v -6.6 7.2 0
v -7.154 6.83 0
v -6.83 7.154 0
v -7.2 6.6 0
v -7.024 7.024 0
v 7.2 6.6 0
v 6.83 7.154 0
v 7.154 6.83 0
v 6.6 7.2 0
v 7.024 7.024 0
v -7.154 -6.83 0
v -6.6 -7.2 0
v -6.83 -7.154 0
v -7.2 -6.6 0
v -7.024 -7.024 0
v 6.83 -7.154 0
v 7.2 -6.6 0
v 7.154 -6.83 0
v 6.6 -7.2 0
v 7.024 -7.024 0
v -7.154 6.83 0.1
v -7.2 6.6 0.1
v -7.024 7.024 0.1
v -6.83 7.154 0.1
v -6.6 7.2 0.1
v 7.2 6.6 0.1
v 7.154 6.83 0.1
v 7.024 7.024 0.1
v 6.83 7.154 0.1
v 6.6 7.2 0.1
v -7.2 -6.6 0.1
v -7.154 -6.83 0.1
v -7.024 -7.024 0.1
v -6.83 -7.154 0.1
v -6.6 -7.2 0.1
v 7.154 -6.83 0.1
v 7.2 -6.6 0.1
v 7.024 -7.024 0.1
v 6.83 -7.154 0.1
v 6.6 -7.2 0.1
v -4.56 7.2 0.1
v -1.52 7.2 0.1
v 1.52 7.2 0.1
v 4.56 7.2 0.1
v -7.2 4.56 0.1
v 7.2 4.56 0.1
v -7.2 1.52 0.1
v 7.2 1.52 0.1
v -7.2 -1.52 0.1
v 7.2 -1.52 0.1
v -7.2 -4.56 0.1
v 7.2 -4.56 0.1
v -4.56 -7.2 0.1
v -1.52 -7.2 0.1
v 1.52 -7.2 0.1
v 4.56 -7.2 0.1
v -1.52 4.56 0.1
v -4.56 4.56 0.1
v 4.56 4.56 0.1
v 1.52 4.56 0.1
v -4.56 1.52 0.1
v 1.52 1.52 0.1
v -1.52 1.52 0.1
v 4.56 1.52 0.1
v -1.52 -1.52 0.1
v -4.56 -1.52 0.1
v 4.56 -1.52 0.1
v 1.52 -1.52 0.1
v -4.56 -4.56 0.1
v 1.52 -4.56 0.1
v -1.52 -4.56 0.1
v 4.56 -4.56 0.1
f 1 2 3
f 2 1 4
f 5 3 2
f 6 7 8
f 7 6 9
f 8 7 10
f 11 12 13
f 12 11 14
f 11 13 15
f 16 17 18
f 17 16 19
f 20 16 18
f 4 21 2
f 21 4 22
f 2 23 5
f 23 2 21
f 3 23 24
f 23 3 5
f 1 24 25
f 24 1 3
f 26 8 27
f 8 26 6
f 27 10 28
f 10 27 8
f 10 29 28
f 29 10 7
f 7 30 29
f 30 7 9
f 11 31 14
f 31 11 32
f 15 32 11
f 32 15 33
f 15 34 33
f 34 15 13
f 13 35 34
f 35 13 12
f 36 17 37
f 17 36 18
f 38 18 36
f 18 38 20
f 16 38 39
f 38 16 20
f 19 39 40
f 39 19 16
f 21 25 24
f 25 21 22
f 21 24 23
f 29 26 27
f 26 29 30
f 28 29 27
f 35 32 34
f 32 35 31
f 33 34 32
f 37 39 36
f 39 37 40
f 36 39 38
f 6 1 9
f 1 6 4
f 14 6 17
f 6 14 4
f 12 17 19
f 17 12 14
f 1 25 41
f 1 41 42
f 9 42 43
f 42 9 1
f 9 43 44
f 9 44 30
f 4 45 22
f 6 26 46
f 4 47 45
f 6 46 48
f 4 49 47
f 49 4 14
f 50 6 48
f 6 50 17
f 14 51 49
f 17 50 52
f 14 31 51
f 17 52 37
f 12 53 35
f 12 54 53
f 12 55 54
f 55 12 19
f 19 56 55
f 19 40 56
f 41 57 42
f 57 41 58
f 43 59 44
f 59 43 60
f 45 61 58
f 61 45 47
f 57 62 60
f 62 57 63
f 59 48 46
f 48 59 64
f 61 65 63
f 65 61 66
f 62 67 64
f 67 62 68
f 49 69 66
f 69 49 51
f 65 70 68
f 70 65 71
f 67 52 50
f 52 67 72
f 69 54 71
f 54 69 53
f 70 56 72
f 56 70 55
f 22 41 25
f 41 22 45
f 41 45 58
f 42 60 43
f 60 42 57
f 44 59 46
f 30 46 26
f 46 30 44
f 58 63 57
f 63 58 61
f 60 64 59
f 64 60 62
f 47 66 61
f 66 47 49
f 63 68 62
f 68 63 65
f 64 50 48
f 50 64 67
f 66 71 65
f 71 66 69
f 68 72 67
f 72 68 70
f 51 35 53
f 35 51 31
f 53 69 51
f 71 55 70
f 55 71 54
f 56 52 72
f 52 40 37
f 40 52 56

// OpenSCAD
// file: ../p/1-4cyli.scad
use <../lib.scad>
function ldraw_lib__1_4cyli() = [
// 0 Cylinder 0.25
// 0 Name: 1-4cyli.dat
// 0 Author: James Jessiman
// 0 !LDRAW_ORG Primitive UPDATE 2012-01
// 0 !LICENSE Licensed under CC BY 4.0 : see CAreadme.txt
// 
// 0 BFC CERTIFY CCW
  [0,"BFC","CERTIFY"],
  [0,"BFC","CCW"],
// 
// 0 !HISTORY 2002-03-23 [sbliss] Added BFC statement.
// 0 !HISTORY 2002-04-25 [PTadmin] Official Update 2002-02
// 0 !HISTORY 2007-06-22 [PTadmin] Header formatted for Contributor Agreement
// 0 !HISTORY 2008-07-01 [PTadmin] Official Update 2008-01
// 0 !HISTORY 2012-02-16 [Philo] Changed to CCW
// 0 !HISTORY 2012-03-30 [PTadmin] Official Update 2012-01
// 
// 
// 4 16 1 1 0 0.9239 1 0.3827 0.9239 0 0.3827 1 0 0
  [4,16,1,1,0,0.9239,1,0.3827,0.9239,0,0.3827,1,0,0],
// 5 24 1 0 0 1 1 0 0.9239 0 0.3827 1 0 -1
  [5,24,1,0,0,1,1,0,0.9239,0,0.3827,1,0,-1],
// 4 16 0.9239 1 0.3827 0.7071 1 0.7071 0.7071 0 0.7071 0.9239 0 0.3827
  [4,16,0.9239,1,0.3827,0.7071,1,0.7071,0.7071,0,0.7071,0.9239,0,0.3827],
// 5 24 0.9239 0 0.3827 0.9239 1 0.3827 0.7071 0 0.7071 1 0 0
  [5,24,0.9239,0,0.3827,0.9239,1,0.3827,0.7071,0,0.7071,1,0,0],
// 4 16 0.7071 1 0.7071 0.3827 1 0.9239 0.3827 0 0.9239 0.7071 0 0.7071
  [4,16,0.7071,1,0.7071,0.3827,1,0.9239,0.3827,0,0.9239,0.7071,0,0.7071],
// 5 24 0.7071 0 0.7071 0.7071 1 0.7071 0.3827 0 0.9239 0.9239 0 0.3827
  [5,24,0.7071,0,0.7071,0.7071,1,0.7071,0.3827,0,0.9239,0.9239,0,0.3827],
// 4 16 0.3827 1 0.9239 0 1 1 0 0 1 0.3827 0 0.9239
  [4,16,0.3827,1,0.9239,0,1,1,0,0,1,0.3827,0,0.9239],
// 5 24 0.3827 0 0.9239 0.3827 1 0.9239 0 0 1 0.7071 0 0.7071
  [5,24,0.3827,0,0.9239,0.3827,1,0.9239,0,0,1,0.7071,0,0.7071],
// 5 24 0 0 1 0 1 1 0.3827 0 0.9239 -1 0 1
  [5,24,0,0,1,0,1,1,0.3827,0,0.9239,-1,0,1],
];
module ldraw_lib__1_4cyli(step=0, col=false, unit=2/5, alt=false, line=0.2, solid=!$preview)
    makepoly(ldraw_lib__1_4cyli(), step=step, col=col, unit=unit, alt=alt, line=line, solid=solid);
ldraw_lib__1_4cyli(line=0.2);
// file: ../p/1-4chrd.scad
use <../lib.scad>
function ldraw_lib__1_4chrd() = [
// 0 Chord 0.25
// 0 Name: 1-4chrd.dat
// 0 Author: Max Martin Richter [MMR1988]
// 0 !LDRAW_ORG Primitive UPDATE 2023-05
// 0 !LICENSE Licensed under CC BY 4.0 : see CAreadme.txt
// 
// 0 BFC CERTIFY CCW
  [0,"BFC","CERTIFY"],
  [0,"BFC","CCW"],
// 
// 0 !HISTORY 2004-04-22 [PTadmin] Official Update 2004-02
// 0 !HISTORY 2007-10-09 [PTadmin] Header formatted for Contributor Agreement
// 0 !HISTORY 2008-07-01 [PTadmin] Official Update 2008-01
// 0 !HISTORY 2012-08-02 [MMR1988] Re-creation with PrimGen2 and Rectifier
// 0 !HISTORY 2012-08-09 [PTadmin] Official Update 2012-02
// 0 !HISTORY 2023-10-27 [OrionP] Change author to MMR1988 from hafhead
// 0 !HISTORY 2023-10-31 [OrionP] Official Update 2023-05
// 
// 4 16 0.9239 0 0.3827 0.3827 0 0.9239 0 0 1 1 0 0
  [4,16,0.9239,0,0.3827,0.3827,0,0.9239,0,0,1,1,0,0],
// 3 16 0.7071 0 0.7071 0.3827 0 0.9239 0.9239 0 0.3827
  [3,16,0.7071,0,0.7071,0.3827,0,0.9239,0.9239,0,0.3827],
];
module ldraw_lib__1_4chrd(step=0, col=false, unit=2/5, alt=false, line=0.2, solid=!$preview)
    makepoly(ldraw_lib__1_4chrd(), step=step, col=col, unit=unit, alt=alt, line=line, solid=solid);
ldraw_lib__1_4chrd(line=0.2);
// main file
use <../lib.scad>
use <../p/1-4chrd.scad>
use <../p/1-4cyli.scad>
function ldraw_lib__6221655aj() = [
// 0 Sticker  1.8 x  1.8 Chequered
// 0 Name: 6221655aj.dat
// 0 Author: Massimo Maso [Sirio]
// 0 !LDRAW_ORG Part UPDATE 2024-09
// 0 !LICENSE Licensed under CC BY 4.0 : see CAreadme.txt
// 
// 0 BFC CERTIFY CCW
  [0,"BFC","CERTIFY"],
  [0,"BFC","CCW"],
// 
// 0 !KEYWORDS 3.0, 911 RSR, Porsche, Set 75888, Speed Champions, Turbo
// 
// 0 !HISTORY 2024-10-27 [OrionP] Official Update 2024-09
// 
// 0 // Primitives
// 1 16 -16.5 0 16.5 -1.5 0 0 0 -1 0 0 0 1.5 1-4chrd.dat
  [1,16,-16.5,0,16.5,-1.5,0,0,0,-1,0,0,0,1.5, ldraw_lib__1_4chrd()],
// 1 16 16.5 0 16.5 1.5 0 0 0 -1 0 0 0 1.5 1-4chrd.dat
  [1,16,16.5,0,16.5,1.5,0,0,0,-1,0,0,0,1.5, ldraw_lib__1_4chrd()],
// 1 16 -16.5 0 -16.5 -1.5 0 0 0 -1 0 0 0 -1.5 1-4chrd.dat
  [1,16,-16.5,0,-16.5,-1.5,0,0,0,-1,0,0,0,-1.5, ldraw_lib__1_4chrd()],
// 1 16 16.5 0 -16.5 1.5 0 0 0 -1 0 0 0 -1.5 1-4chrd.dat
  [1,16,16.5,0,-16.5,1.5,0,0,0,-1,0,0,0,-1.5, ldraw_lib__1_4chrd()],
// 1 16 -16.5 0 16.5 -1.5 0 0 0 -.25 0 0 0 1.5 1-4cyli.dat
  [1,16,-16.5,0,16.5,-1.5,0,0,0,-.25,0,0,0,1.5, ldraw_lib__1_4cyli()],
// 1 16 16.5 0 16.5 1.5 0 0 0 -.25 0 0 0 1.5 1-4cyli.dat
  [1,16,16.5,0,16.5,1.5,0,0,0,-.25,0,0,0,1.5, ldraw_lib__1_4cyli()],
// 1 16 -16.5 0 -16.5 -1.5 0 0 0 -.25 0 0 0 -1.5 1-4cyli.dat
  [1,16,-16.5,0,-16.5,-1.5,0,0,0,-.25,0,0,0,-1.5, ldraw_lib__1_4cyli()],
// 1 16 16.5 0 -16.5 1.5 0 0 0 -.25 0 0 0 -1.5 1-4cyli.dat
  [1,16,16.5,0,-16.5,1.5,0,0,0,-.25,0,0,0,-1.5, ldraw_lib__1_4cyli()],
// 1 0 -16.5 -.25 16.5 -1.5 0 0 0 1 0 0 0 1.5 1-4chrd.dat
  [1,0,-16.5,-.25,16.5,-1.5,0,0,0,1,0,0,0,1.5, ldraw_lib__1_4chrd()],
// 1 0 16.5 -.25 16.5 1.5 0 0 0 1 0 0 0 1.5 1-4chrd.dat
  [1,0,16.5,-.25,16.5,1.5,0,0,0,1,0,0,0,1.5, ldraw_lib__1_4chrd()],
// 1 0 -16.5 -.25 -16.5 -1.5 0 0 0 1 0 0 0 -1.5 1-4chrd.dat
  [1,0,-16.5,-.25,-16.5,-1.5,0,0,0,1,0,0,0,-1.5, ldraw_lib__1_4chrd()],
// 1 0 16.5 -.25 -16.5 1.5 0 0 0 1 0 0 0 -1.5 1-4chrd.dat
  [1,0,16.5,-.25,-16.5,1.5,0,0,0,1,0,0,0,-1.5, ldraw_lib__1_4chrd()],
// 0 // Bottom faces
// 4 16 16.5 0 18 18 0 16.5 -18 0 16.5 -16.5 0 18
  [4,16,16.5,0,18,18,0,16.5,-18,0,16.5,-16.5,0,18],
// 4 16 18 0 16.5 18 0 -16.5 -18 0 -16.5 -18 0 16.5
  [4,16,18,0,16.5,18,0,-16.5,-18,0,-16.5,-18,0,16.5],
// 4 16 16.5 0 -18 -16.5 0 -18 -18 0 -16.5 18 0 -16.5
  [4,16,16.5,0,-18,-16.5,0,-18,-18,0,-16.5,18,0,-16.5],
// 0 // Lateral faces
// 3 16 -16.5 0 18 -16.5 -.25 18 -11.4 -.25 18
  [3,16,-16.5,0,18,-16.5,-.25,18,-11.4,-.25,18],
// 3 16 -16.5 0 18 -11.4 -.25 18 -3.8 -.25 18
  [3,16,-16.5,0,18,-11.4,-.25,18,-3.8,-.25,18],
// 4 16 -16.5 0 18 -3.8 -.25 18 3.8 -.25 18 16.5 0 18
  [4,16,-16.5,0,18,-3.8,-.25,18,3.8,-.25,18,16.5,0,18],
// 3 16 16.5 0 18 3.8 -.25 18 11.4 -.25 18
  [3,16,16.5,0,18,3.8,-.25,18,11.4,-.25,18],
// 3 16 16.5 0 18 11.4 -.25 18 16.5 -.25 18
  [3,16,16.5,0,18,11.4,-.25,18,16.5,-.25,18],
// 3 16 -18 0 16.5 -18 -.25 11.4 -18 -.25 16.5
  [3,16,-18,0,16.5,-18,-.25,11.4,-18,-.25,16.5],
// 3 16 18 0 16.5 18 -.25 16.5 18 -.25 11.4
  [3,16,18,0,16.5,18,-.25,16.5,18,-.25,11.4],
// 3 16 -18 0 16.5 -18 -.25 3.8 -18 -.25 11.4
  [3,16,-18,0,16.5,-18,-.25,3.8,-18,-.25,11.4],
// 3 16 18 0 16.5 18 -.25 11.4 18 -.25 3.8
  [3,16,18,0,16.5,18,-.25,11.4,18,-.25,3.8],
// 4 16 -18 0 16.5 -18 0 -16.5 -18 -.25 -3.8 -18 -.25 3.8
  [4,16,-18,0,16.5,-18,0,-16.5,-18,-.25,-3.8,-18,-.25,3.8],
// 4 16 18 0 16.5 18 -.25 3.8 18 -.25 -3.8 18 0 -16.5
  [4,16,18,0,16.5,18,-.25,3.8,18,-.25,-3.8,18,0,-16.5],
// 3 16 -18 0 -16.5 -18 -.25 -11.4 -18 -.25 -3.8
  [3,16,-18,0,-16.5,-18,-.25,-11.4,-18,-.25,-3.8],
// 3 16 18 0 -16.5 18 -.25 -3.8 18 -.25 -11.4
  [3,16,18,0,-16.5,18,-.25,-3.8,18,-.25,-11.4],
// 3 16 -18 0 -16.5 -18 -.25 -16.5 -18 -.25 -11.4
  [3,16,-18,0,-16.5,-18,-.25,-16.5,-18,-.25,-11.4],
// 3 16 18 0 -16.5 18 -.25 -11.4 18 -.25 -16.5
  [3,16,18,0,-16.5,18,-.25,-11.4,18,-.25,-16.5],
// 3 16 -16.5 0 -18 -11.4 -.25 -18 -16.5 -.25 -18
  [3,16,-16.5,0,-18,-11.4,-.25,-18,-16.5,-.25,-18],
// 3 16 -16.5 0 -18 -3.8 -.25 -18 -11.4 -.25 -18
  [3,16,-16.5,0,-18,-3.8,-.25,-18,-11.4,-.25,-18],
// 4 16 -16.5 0 -18 16.5 0 -18 3.8 -.25 -18 -3.8 -.25 -18
  [4,16,-16.5,0,-18,16.5,0,-18,3.8,-.25,-18,-3.8,-.25,-18],
// 3 16 16.5 0 -18 11.4 -.25 -18 3.8 -.25 -18
  [3,16,16.5,0,-18,11.4,-.25,-18,3.8,-.25,-18],
// 3 16 16.5 0 -18 16.5 -.25 -18 11.4 -.25 -18
  [3,16,16.5,0,-18,16.5,-.25,-18,11.4,-.25,-18],
// 0 // White top faces
// 4 15 -11.4 -.25 18 -11.4 -.25 11.4 -3.8 -.25 11.4 -3.8 -.25 18
  [4,15,-11.4,-.25,18,-11.4,-.25,11.4,-3.8,-.25,11.4,-3.8,-.25,18],
// 4 15 3.8 -.25 18 3.8 -.25 11.4 11.4 -.25 11.4 11.4 -.25 18
  [4,15,3.8,-.25,18,3.8,-.25,11.4,11.4,-.25,11.4,11.4,-.25,18],
// 4 15 -18 -.25 11.4 -18 -.25 3.8 -11.4 -.25 3.8 -11.4 -.25 11.4
  [4,15,-18,-.25,11.4,-18,-.25,3.8,-11.4,-.25,3.8,-11.4,-.25,11.4],
// 4 15 -3.8 -.25 11.4 -3.8 -.25 3.8 3.8 -.25 3.8 3.8 -.25 11.4
  [4,15,-3.8,-.25,11.4,-3.8,-.25,3.8,3.8,-.25,3.8,3.8,-.25,11.4],
// 4 15 11.4 -.25 11.4 11.4 -.25 3.8 18 -.25 3.8 18 -.25 11.4
  [4,15,11.4,-.25,11.4,11.4,-.25,3.8,18,-.25,3.8,18,-.25,11.4],
// 4 15 -11.4 -.25 3.8 -11.4 -.25 -3.8 -3.8 -.25 -3.8 -3.8 -.25 3.8
  [4,15,-11.4,-.25,3.8,-11.4,-.25,-3.8,-3.8,-.25,-3.8,-3.8,-.25,3.8],
// 4 15 3.8 -.25 3.8 3.8 -.25 -3.8 11.4 -.25 -3.8 11.4 -.25 3.8
  [4,15,3.8,-.25,3.8,3.8,-.25,-3.8,11.4,-.25,-3.8,11.4,-.25,3.8],
// 4 15 -18 -.25 -3.8 -18 -.25 -11.4 -11.4 -.25 -11.4 -11.4 -.25 -3.8
  [4,15,-18,-.25,-3.8,-18,-.25,-11.4,-11.4,-.25,-11.4,-11.4,-.25,-3.8],
// 4 15 -3.8 -.25 -3.8 -3.8 -.25 -11.4 3.8 -.25 -11.4 3.8 -.25 -3.8
  [4,15,-3.8,-.25,-3.8,-3.8,-.25,-11.4,3.8,-.25,-11.4,3.8,-.25,-3.8],
// 4 15 11.4 -.25 -3.8 11.4 -.25 -11.4 18 -.25 -11.4 18 -.25 -3.8
  [4,15,11.4,-.25,-3.8,11.4,-.25,-11.4,18,-.25,-11.4,18,-.25,-3.8],
// 4 15 -11.4 -.25 -11.4 -11.4 -.25 -18 -3.8 -.25 -18 -3.8 -.25 -11.4
  [4,15,-11.4,-.25,-11.4,-11.4,-.25,-18,-3.8,-.25,-18,-3.8,-.25,-11.4],
// 4 15 3.8 -.25 -11.4 3.8 -.25 -18 11.4 -.25 -18 11.4 -.25 -11.4
  [4,15,3.8,-.25,-11.4,3.8,-.25,-18,11.4,-.25,-18,11.4,-.25,-11.4],
// 0 // Black top faces
// 4 0 -11.4 -.25 18 -16.5 -.25 18 -18 -.25 16.5 -18 -.25 11.4
  [4,0,-11.4,-.25,18,-16.5,-.25,18,-18,-.25,16.5,-18,-.25,11.4],
// 3 0 -11.4 -.25 18 -18 -.25 11.4 -11.4 -.25 11.4
  [3,0,-11.4,-.25,18,-18,-.25,11.4,-11.4,-.25,11.4],
// 4 0 -3.8 -.25 18 -3.8 -.25 11.4 3.8 -.25 11.4 3.8 -.25 18
  [4,0,-3.8,-.25,18,-3.8,-.25,11.4,3.8,-.25,11.4,3.8,-.25,18],
// 3 0 11.4 -.25 18 11.4 -.25 11.4 18 -.25 11.4
  [3,0,11.4,-.25,18,11.4,-.25,11.4,18,-.25,11.4],
// 4 0 11.4 -.25 18 18 -.25 11.4 18 -.25 16.5 16.5 -.25 18
  [4,0,11.4,-.25,18,18,-.25,11.4,18,-.25,16.5,16.5,-.25,18],
// 4 0 -11.4 -.25 11.4 -11.4 -.25 3.8 -3.8 -.25 3.8 -3.8 -.25 11.4
  [4,0,-11.4,-.25,11.4,-11.4,-.25,3.8,-3.8,-.25,3.8,-3.8,-.25,11.4],
// 4 0 3.8 -.25 11.4 3.8 -.25 3.8 11.4 -.25 3.8 11.4 -.25 11.4
  [4,0,3.8,-.25,11.4,3.8,-.25,3.8,11.4,-.25,3.8,11.4,-.25,11.4],
// 4 0 -18 -.25 3.8 -18 -.25 -3.8 -11.4 -.25 -3.8 -11.4 -.25 3.8
  [4,0,-18,-.25,3.8,-18,-.25,-3.8,-11.4,-.25,-3.8,-11.4,-.25,3.8],
// 4 0 -3.8 -.25 3.8 -3.8 -.25 -3.8 3.8 -.25 -3.8 3.8 -.25 3.8
  [4,0,-3.8,-.25,3.8,-3.8,-.25,-3.8,3.8,-.25,-3.8,3.8,-.25,3.8],
// 4 0 11.4 -.25 3.8 11.4 -.25 -3.8 18 -.25 -3.8 18 -.25 3.8
  [4,0,11.4,-.25,3.8,11.4,-.25,-3.8,18,-.25,-3.8,18,-.25,3.8],
// 4 0 -11.4 -.25 -3.8 -11.4 -.25 -11.4 -3.8 -.25 -11.4 -3.8 -.25 -3.8
  [4,0,-11.4,-.25,-3.8,-11.4,-.25,-11.4,-3.8,-.25,-11.4,-3.8,-.25,-3.8],
// 4 0 3.8 -.25 -3.8 3.8 -.25 -11.4 11.4 -.25 -11.4 11.4 -.25 -3.8
  [4,0,3.8,-.25,-3.8,3.8,-.25,-11.4,11.4,-.25,-11.4,11.4,-.25,-3.8],
// 4 0 -11.4 -.25 -18 -18 -.25 -11.4 -18 -.25 -16.5 -16.5 -.25 -18
  [4,0,-11.4,-.25,-18,-18,-.25,-11.4,-18,-.25,-16.5,-16.5,-.25,-18],
// 3 0 -11.4 -.25 -18 -11.4 -.25 -11.4 -18 -.25 -11.4
  [3,0,-11.4,-.25,-18,-11.4,-.25,-11.4,-18,-.25,-11.4],
// 4 0 -3.8 -.25 -11.4 -3.8 -.25 -18 3.8 -.25 -18 3.8 -.25 -11.4
  [4,0,-3.8,-.25,-11.4,-3.8,-.25,-18,3.8,-.25,-18,3.8,-.25,-11.4],
// 3 0 11.4 -.25 -18 18 -.25 -11.4 11.4 -.25 -11.4
  [3,0,11.4,-.25,-18,18,-.25,-11.4,11.4,-.25,-11.4],
// 4 0 11.4 -.25 -18 16.5 -.25 -18 18 -.25 -16.5 18 -.25 -11.4
  [4,0,11.4,-.25,-18,16.5,-.25,-18,18,-.25,-16.5,18,-.25,-11.4],
];
module ldraw_lib__6221655aj(step=0, col=false, unit=2/5, alt=false, line=0.2, solid=!$preview)
    makepoly(ldraw_lib__6221655aj(), step=step, col=col, unit=unit, alt=alt, line=line, solid=solid);
ldraw_lib__6221655aj(line=0.2);
